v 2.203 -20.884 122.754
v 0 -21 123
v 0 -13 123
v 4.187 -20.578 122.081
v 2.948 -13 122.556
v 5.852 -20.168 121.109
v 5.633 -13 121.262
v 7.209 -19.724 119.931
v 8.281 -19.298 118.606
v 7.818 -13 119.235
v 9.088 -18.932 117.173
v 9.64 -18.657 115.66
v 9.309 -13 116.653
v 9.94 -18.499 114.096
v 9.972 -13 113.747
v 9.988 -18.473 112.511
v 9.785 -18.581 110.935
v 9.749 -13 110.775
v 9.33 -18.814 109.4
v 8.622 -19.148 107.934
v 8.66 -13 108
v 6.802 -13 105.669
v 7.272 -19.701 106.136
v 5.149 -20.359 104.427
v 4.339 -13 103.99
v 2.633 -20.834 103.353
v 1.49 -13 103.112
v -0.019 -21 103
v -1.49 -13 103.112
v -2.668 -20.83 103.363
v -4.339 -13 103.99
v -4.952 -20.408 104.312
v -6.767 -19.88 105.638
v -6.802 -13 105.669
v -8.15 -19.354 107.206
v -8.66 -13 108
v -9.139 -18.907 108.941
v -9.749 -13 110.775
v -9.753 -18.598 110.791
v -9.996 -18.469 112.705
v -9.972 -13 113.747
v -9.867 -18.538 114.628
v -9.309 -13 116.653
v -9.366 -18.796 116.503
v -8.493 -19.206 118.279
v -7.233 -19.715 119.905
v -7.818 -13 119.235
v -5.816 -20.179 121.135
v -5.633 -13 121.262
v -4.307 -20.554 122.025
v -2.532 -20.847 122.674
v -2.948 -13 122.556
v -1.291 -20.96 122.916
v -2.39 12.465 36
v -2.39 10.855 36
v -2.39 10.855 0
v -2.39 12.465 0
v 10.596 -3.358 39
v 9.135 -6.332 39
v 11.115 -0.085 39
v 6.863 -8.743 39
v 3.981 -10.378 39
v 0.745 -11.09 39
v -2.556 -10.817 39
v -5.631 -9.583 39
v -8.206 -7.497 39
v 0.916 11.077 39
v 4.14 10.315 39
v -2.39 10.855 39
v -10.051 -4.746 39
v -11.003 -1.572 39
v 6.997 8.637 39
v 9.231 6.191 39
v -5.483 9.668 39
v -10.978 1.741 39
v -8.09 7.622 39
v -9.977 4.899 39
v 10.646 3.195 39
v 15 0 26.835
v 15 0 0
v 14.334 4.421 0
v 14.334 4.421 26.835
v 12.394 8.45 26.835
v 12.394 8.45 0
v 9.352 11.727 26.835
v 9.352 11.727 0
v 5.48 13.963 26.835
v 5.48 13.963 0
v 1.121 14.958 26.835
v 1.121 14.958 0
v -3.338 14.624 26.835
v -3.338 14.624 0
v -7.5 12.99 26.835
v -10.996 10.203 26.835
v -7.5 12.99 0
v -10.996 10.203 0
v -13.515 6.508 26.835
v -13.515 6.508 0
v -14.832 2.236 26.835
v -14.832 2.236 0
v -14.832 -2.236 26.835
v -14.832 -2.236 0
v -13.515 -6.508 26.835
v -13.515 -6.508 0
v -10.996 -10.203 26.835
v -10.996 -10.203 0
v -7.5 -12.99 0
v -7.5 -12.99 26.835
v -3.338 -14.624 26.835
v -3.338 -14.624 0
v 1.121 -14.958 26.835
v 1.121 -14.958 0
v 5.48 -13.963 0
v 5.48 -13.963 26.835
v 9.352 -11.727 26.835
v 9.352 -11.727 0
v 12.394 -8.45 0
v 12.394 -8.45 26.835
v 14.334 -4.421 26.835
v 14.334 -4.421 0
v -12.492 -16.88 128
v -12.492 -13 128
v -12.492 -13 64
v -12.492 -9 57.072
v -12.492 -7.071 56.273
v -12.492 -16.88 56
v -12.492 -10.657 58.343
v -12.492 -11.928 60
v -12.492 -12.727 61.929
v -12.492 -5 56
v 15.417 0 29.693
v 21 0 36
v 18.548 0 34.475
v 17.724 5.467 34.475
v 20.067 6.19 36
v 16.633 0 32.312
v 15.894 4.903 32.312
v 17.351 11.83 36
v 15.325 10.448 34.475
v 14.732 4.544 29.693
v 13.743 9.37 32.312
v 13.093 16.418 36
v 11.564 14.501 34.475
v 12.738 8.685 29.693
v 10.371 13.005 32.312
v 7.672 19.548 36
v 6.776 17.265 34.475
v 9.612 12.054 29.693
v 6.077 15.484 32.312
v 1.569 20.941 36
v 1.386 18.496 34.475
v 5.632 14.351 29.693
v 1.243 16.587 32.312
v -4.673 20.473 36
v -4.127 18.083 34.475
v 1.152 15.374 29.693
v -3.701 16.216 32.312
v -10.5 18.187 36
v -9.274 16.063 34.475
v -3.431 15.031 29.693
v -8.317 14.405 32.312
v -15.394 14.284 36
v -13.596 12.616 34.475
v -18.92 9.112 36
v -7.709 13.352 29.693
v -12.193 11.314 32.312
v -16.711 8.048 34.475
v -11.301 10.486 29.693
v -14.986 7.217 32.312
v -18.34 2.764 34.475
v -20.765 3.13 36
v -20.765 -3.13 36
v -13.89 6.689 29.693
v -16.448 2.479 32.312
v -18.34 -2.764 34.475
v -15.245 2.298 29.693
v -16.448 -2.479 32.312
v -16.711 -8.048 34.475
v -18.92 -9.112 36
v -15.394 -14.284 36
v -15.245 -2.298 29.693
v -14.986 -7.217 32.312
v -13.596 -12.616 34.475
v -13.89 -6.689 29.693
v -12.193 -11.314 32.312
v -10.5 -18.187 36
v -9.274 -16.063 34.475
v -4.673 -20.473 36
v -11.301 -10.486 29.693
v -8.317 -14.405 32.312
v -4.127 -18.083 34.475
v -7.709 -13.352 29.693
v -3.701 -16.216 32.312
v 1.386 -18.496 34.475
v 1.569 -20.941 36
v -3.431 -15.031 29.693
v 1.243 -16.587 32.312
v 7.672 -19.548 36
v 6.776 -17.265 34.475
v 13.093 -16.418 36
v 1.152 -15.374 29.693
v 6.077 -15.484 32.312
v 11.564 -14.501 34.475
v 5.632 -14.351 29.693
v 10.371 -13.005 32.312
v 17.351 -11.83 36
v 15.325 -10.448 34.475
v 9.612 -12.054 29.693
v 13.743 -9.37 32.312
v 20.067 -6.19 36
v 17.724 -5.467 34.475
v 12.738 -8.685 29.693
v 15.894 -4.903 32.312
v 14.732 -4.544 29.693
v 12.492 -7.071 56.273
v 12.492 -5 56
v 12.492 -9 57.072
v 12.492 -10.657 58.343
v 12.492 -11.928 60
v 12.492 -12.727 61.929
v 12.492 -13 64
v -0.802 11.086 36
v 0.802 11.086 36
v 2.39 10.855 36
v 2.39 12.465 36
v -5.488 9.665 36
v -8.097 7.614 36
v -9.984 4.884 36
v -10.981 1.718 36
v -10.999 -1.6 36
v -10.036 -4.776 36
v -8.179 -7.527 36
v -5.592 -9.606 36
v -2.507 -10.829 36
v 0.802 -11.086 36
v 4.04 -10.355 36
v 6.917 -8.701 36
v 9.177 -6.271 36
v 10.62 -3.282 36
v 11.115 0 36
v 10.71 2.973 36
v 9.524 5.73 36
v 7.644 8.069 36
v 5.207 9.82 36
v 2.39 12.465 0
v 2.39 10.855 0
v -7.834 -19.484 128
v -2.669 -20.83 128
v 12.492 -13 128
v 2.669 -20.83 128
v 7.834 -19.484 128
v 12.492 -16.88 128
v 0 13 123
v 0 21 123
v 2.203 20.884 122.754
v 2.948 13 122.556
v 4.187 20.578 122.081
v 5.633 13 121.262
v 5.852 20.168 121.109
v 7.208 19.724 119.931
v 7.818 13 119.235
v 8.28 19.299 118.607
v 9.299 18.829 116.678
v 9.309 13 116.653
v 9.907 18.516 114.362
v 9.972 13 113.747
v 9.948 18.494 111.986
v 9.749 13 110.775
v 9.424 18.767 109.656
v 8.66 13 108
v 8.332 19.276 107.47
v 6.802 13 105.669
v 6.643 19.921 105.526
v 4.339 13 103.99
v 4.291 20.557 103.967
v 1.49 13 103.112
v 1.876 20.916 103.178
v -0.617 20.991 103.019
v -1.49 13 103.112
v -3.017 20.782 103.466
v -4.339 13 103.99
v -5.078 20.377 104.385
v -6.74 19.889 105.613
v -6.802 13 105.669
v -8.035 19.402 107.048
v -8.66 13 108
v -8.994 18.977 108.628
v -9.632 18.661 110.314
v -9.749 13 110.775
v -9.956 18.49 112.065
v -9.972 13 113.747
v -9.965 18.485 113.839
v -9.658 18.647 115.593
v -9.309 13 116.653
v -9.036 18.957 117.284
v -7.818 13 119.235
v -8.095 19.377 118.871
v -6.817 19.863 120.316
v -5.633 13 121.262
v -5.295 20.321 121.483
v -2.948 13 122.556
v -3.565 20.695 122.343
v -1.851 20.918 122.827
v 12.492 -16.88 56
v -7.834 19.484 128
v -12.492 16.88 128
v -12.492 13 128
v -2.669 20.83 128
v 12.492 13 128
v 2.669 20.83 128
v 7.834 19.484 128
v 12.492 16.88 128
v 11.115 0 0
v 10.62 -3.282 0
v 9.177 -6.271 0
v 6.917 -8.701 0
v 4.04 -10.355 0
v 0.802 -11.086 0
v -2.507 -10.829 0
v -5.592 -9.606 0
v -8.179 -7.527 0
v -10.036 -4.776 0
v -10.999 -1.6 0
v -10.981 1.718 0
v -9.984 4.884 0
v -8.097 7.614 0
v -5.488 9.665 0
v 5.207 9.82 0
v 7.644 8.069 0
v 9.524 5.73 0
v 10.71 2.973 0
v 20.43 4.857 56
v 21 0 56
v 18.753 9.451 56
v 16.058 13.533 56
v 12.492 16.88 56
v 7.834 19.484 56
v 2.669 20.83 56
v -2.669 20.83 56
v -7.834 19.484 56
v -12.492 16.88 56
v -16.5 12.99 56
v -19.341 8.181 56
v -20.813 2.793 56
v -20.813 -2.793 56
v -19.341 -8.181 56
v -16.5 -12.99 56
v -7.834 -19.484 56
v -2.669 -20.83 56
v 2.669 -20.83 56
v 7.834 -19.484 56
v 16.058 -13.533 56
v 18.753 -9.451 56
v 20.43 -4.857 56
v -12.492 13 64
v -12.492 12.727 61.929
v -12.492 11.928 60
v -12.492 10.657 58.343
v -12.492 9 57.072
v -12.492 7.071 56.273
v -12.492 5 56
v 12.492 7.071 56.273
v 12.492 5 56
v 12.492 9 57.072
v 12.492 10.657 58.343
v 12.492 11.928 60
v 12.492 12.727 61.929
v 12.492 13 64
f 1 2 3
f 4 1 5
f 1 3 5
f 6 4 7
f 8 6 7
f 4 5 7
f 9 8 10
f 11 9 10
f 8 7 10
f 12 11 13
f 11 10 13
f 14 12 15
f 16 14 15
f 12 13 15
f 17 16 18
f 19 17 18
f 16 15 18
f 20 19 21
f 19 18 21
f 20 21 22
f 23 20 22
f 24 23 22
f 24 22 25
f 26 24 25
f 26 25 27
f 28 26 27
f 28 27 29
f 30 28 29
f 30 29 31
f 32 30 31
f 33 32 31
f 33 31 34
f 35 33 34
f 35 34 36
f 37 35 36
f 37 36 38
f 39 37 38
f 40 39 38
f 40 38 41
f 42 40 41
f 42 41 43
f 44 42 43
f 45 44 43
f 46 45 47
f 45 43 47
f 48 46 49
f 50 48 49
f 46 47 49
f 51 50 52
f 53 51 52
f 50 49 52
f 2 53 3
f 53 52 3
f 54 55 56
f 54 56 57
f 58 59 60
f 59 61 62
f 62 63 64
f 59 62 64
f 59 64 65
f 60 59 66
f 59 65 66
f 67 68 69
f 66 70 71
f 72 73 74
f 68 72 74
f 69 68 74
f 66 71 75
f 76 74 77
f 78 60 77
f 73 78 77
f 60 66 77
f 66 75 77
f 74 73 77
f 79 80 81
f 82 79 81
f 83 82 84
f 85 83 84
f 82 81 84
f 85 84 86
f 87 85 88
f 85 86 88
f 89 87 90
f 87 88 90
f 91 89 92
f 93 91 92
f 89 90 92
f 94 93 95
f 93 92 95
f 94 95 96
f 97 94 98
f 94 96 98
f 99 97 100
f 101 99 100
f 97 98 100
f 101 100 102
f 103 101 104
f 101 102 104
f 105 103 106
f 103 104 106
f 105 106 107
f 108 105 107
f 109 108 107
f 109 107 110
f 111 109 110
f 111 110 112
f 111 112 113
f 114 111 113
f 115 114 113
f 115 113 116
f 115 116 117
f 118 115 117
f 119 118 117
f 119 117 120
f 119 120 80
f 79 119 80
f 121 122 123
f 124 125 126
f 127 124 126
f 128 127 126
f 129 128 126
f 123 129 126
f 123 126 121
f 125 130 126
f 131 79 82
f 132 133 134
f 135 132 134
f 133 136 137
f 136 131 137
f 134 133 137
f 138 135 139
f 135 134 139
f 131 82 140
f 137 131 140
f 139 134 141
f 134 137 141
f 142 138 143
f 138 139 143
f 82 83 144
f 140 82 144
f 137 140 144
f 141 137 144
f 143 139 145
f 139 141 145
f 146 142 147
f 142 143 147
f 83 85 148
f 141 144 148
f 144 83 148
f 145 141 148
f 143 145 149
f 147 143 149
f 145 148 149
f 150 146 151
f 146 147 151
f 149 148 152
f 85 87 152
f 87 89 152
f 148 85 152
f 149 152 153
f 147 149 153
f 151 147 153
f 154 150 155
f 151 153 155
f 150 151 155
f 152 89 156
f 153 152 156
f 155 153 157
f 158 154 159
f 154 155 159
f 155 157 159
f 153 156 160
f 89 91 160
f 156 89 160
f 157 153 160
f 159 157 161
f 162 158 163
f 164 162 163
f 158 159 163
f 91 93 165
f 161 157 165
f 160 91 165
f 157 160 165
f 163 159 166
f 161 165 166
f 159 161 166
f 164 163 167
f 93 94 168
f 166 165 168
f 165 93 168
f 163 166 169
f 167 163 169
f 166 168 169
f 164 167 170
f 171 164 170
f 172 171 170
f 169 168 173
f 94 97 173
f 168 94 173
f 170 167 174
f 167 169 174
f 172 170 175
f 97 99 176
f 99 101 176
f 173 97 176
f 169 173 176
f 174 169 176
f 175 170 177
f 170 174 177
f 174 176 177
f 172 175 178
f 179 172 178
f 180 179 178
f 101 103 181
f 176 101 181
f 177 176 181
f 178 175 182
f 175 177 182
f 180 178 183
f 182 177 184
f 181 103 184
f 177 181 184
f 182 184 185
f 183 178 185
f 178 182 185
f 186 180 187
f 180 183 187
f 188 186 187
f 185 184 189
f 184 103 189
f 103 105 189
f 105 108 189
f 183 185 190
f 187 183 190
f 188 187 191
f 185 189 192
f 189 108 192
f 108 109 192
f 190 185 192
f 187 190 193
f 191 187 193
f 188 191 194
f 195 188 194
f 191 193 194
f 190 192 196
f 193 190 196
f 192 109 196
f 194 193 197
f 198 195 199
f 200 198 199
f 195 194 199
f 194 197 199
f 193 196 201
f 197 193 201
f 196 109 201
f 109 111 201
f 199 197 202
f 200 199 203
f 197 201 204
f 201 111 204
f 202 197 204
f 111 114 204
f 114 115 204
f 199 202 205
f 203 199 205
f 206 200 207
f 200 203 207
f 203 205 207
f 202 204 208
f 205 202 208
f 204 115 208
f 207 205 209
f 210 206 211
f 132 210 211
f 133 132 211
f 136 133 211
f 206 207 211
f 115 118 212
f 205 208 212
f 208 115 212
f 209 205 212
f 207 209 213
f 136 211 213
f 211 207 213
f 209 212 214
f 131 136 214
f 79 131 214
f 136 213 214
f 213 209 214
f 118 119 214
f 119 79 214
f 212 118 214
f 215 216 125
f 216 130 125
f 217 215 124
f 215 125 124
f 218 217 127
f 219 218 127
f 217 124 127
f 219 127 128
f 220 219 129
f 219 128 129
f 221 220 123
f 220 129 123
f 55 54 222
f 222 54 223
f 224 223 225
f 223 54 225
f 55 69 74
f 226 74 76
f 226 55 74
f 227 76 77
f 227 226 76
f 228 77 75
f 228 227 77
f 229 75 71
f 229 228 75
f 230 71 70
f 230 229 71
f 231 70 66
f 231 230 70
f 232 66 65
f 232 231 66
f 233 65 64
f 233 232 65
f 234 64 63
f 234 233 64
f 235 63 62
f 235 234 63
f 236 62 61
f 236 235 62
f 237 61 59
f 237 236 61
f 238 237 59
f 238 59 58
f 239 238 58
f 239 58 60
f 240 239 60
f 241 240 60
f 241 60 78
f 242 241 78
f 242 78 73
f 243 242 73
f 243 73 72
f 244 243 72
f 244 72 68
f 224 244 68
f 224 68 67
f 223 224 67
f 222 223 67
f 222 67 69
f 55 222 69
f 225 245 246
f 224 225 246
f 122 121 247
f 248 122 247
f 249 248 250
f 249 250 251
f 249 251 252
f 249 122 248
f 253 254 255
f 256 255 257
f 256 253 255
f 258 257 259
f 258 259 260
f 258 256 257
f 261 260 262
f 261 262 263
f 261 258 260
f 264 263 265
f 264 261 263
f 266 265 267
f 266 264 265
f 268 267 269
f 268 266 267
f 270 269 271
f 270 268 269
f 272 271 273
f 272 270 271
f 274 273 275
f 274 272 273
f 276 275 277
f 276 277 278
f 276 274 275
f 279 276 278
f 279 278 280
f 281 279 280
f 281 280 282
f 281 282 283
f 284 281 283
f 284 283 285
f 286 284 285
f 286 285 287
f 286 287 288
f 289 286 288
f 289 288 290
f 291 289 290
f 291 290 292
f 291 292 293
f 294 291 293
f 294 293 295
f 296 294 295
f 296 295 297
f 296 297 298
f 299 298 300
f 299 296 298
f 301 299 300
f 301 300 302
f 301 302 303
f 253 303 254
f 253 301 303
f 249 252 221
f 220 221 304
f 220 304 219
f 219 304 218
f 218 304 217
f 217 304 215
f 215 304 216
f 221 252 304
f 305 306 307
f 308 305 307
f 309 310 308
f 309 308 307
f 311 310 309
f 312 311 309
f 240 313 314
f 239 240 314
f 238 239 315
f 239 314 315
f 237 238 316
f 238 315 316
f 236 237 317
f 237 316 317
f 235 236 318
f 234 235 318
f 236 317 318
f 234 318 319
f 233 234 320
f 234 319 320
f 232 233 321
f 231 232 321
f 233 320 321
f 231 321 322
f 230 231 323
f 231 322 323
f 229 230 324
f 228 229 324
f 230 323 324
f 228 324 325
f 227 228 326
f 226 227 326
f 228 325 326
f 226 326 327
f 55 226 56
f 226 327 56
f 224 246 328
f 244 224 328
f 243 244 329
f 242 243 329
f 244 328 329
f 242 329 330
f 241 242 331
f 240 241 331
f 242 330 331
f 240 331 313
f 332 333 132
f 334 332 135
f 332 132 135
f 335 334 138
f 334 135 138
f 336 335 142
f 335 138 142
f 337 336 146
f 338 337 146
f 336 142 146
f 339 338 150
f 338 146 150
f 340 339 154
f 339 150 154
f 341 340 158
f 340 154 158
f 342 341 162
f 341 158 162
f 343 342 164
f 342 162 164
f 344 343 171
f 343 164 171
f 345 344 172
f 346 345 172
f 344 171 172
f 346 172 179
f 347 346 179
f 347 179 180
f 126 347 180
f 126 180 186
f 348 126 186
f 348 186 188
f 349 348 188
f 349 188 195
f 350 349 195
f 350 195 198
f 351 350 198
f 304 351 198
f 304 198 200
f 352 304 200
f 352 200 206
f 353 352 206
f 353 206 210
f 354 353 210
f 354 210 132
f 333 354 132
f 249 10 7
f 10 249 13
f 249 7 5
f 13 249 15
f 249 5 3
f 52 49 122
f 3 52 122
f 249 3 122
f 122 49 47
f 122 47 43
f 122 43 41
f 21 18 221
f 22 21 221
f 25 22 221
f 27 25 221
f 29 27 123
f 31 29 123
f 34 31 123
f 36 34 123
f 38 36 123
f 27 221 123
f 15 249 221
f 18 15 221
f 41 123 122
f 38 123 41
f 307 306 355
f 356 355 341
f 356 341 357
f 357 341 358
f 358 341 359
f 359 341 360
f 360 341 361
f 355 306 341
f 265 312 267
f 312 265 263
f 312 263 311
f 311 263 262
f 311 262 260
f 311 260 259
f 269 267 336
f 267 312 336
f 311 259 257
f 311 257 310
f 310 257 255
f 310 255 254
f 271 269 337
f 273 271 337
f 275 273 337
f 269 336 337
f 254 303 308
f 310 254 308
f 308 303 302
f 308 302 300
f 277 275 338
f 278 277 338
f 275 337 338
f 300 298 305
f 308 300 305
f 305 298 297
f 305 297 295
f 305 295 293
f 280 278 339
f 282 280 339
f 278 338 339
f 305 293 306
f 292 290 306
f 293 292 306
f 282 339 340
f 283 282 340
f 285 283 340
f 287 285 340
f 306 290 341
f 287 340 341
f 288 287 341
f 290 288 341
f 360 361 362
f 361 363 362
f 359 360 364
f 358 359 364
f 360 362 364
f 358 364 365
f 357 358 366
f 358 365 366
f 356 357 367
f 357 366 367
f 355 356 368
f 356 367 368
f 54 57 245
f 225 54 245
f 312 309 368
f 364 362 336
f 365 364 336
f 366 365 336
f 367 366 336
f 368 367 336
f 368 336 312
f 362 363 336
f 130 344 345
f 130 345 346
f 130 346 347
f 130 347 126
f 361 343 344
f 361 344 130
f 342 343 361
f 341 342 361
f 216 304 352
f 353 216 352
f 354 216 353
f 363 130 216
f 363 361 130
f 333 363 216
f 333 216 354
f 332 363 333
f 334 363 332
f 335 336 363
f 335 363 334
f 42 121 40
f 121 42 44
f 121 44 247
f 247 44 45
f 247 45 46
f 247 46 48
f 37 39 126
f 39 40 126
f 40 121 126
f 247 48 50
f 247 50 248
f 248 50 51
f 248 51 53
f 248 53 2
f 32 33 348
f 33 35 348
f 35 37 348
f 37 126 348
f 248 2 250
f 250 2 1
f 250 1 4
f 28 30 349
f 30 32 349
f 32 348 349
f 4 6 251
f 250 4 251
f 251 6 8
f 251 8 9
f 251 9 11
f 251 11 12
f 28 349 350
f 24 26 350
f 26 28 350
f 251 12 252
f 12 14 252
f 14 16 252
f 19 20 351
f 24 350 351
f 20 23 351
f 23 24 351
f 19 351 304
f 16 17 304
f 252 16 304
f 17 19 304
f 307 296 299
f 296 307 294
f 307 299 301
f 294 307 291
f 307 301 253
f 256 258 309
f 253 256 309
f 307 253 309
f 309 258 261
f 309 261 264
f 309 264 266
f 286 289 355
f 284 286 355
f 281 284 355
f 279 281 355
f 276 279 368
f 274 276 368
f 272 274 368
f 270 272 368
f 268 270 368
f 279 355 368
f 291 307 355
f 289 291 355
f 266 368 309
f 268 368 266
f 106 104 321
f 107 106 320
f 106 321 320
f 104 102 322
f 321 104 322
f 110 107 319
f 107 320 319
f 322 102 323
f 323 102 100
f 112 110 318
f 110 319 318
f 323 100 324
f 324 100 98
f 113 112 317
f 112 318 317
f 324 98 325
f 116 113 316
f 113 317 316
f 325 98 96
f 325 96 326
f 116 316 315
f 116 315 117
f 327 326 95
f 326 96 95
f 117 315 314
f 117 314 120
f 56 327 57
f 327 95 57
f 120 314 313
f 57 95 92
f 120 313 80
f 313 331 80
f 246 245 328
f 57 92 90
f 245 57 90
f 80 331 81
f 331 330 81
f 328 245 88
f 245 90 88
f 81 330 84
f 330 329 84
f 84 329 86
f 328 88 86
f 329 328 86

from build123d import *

# Parameters (mm, degrees)
SZKIC1_R                               = 15
DODANIE_WYCI_GNI_CIE1_DEPTH            = 36
SZKIC3_R                               = 21
SZKIC3_R_2                             = 11.115
DODANIE_WYCI_GNI_CIE2_DEPTH            = 20
DODANIE_WYCI_GNI_CIE4_START            = -17
SZKIC5_R                               = 11.115
DODANIE_WYCI_GNI_CIE4_DEPTH            = 17
ZAOKR_GLENIE1_R                        = 10
DODANIE_WYCI_GNI_CIE3_DEPTH            = 72
ZAOKR_GLENIE2_R                        = 8
WYTNIJ_WYCI_GNI_CIE1_REACH             = 136.093
SZKIC6_R                               = 10
WYTNIJ_WYCI_GNI_CIE1_DIRECTION_2_DEPTH = 135.093251135


with BuildPart() as part:
    # Szkic1 → Dodanie-wyciągnięcie1 (new body)
    with BuildSketch(Plane.XY):
        Circle(SZKIC1_R)
        with BuildLine():
            Line((-2.39, 10.855004606), (-2.39, 12.465))
            Line((-2.39, 12.465), (2.39, 12.465))
            Line((2.39, 12.465), (2.39, 10.855004606))
            ThreePointArc((2.39, 10.855004606), (8.663373333, 6.963417803), (11.115, 0))
            ThreePointArc((11.115, 0), (-6.963417803, -8.663373333), (-2.39, 10.855004606))
        make_face(mode=Mode.SUBTRACT)
    extrude(amount=DODANIE_WYCI_GNI_CIE1_DEPTH)

    # Szkic3 → Dodanie-wyciągnięcie2 (add)
    with BuildSketch(Plane.XY.offset(36)):
        Circle(SZKIC3_R)
        with Locations(Location((0, 0, 0), (0, 0, 102.416978829))):
            Circle(SZKIC3_R_2, mode=Mode.SUBTRACT)
    extrude(amount=DODANIE_WYCI_GNI_CIE2_DEPTH)

    # Szkic5 → Dodanie-wyciągnięcie4 (add)
    with BuildSketch(Plane.XY.offset(56).offset(DODANIE_WYCI_GNI_CIE4_START)):
        with Locations(Location((0, 0, 0), (0, 0, 102.416978829))):
            Circle(SZKIC5_R)
    extrude(amount=DODANIE_WYCI_GNI_CIE4_DEPTH)

    # Zaokrąglenie1
    # the kernel refuses this fillet: 10 mm, written as the material it adds along each edge
    with BuildSketch(Plane(origin=(0, 0, 36), x_dir=(1, 0, 0), z_dir=(0, -1, 0))) as zaokr_glenie1_piece_1:
        with BuildLine():
            CenterArc((25, -9.16515139), ZAOKR_GLENIE1_R, 113.578178478, 66.421821522)
            Line((21, 0), (20.92, 0.183303028))
            ThreePointArc((20.92, 0.183303028), (18, 0.2), (15, 0.2))
            Line((15, 0.2), (14.8, 0))
            Line((14.8, 0), (14.8, -9.16515139))
            Line((14.8, -9.16515139), (15, -9.16515139))
        make_face()
    revolve(axis=Axis((0, 0, 36), (0, 0, 1)))

    # Szkic4 → Dodanie-wyciągnięcie3 (add)
    with BuildSketch(Plane.XY.offset(56)):
        with BuildLine():
            Line((-12.492422502, 16.880147512), (-12.492422502, 13))
            Line((-12.492422502, 13), (12.492422502, 13))
            Line((12.492422502, 13), (12.492422502, 16.880147512))
            ThreePointArc((12.492422502, 16.880147512), (0, 21), (-12.492422502, 16.880147512))
        make_face()
        with BuildLine():
            Line((12.492422502, -13), (-12.492422502, -13))
            Line((-12.492422502, -13), (-12.492422502, -16.880147512))
            ThreePointArc((-12.492422502, -16.880147512), (0, -21), (12.492422502, -16.880147512))
            Line((12.492422502, -16.880147512), (12.492422502, -13))
        make_face()
    extrude(amount=DODANIE_WYCI_GNI_CIE3_DEPTH)

    # Zaokrąglenie2
    zaokr_glenie2_edges = [part.edges().sort_by_distance(p)[0] for p in [
        (0, 13, 56),
        (0, -13, 56),
    ]]
    fillet(zaokr_glenie2_edges, radius=ZAOKR_GLENIE2_R)

    # Szkic6 → Wytnij-wyciągnięcie1 (cut, up to next)
    with BuildSketch(Plane(origin=(0, -13, 0), x_dir=(1, 0, 0), z_dir=(0, 1, 0)), mode=Mode.PRIVATE) as wytnij_wyci_gni_cie1_sk1:
        with Locations(Location((0, -113, 0), (0, 0, 270))):
            Circle(SZKIC6_R)
    wytnij_wyci_gni_cie1_tool1 = extrude(wytnij_wyci_gni_cie1_sk1.sketch, amount=-WYTNIJ_WYCI_GNI_CIE1_REACH, mode=Mode.PRIVATE) & part.part
    add(wytnij_wyci_gni_cie1_tool1.solids().sort_by_distance((0, -13, 113))[0], mode=Mode.SUBTRACT)

    # Szkic6 → Wytnij-wyciągnięcie1 direction 2 (cut)
    with BuildSketch(Plane(origin=(0, -13, 0), x_dir=(1, 0, 0), z_dir=(0, 1, 0))):
        with Locations(Location((0, -113, 0), (0, 0, 270))):
            Circle(SZKIC6_R)
    extrude(amount=WYTNIJ_WYCI_GNI_CIE1_DIRECTION_2_DEPTH, mode=Mode.SUBTRACT)


solid = part.part
